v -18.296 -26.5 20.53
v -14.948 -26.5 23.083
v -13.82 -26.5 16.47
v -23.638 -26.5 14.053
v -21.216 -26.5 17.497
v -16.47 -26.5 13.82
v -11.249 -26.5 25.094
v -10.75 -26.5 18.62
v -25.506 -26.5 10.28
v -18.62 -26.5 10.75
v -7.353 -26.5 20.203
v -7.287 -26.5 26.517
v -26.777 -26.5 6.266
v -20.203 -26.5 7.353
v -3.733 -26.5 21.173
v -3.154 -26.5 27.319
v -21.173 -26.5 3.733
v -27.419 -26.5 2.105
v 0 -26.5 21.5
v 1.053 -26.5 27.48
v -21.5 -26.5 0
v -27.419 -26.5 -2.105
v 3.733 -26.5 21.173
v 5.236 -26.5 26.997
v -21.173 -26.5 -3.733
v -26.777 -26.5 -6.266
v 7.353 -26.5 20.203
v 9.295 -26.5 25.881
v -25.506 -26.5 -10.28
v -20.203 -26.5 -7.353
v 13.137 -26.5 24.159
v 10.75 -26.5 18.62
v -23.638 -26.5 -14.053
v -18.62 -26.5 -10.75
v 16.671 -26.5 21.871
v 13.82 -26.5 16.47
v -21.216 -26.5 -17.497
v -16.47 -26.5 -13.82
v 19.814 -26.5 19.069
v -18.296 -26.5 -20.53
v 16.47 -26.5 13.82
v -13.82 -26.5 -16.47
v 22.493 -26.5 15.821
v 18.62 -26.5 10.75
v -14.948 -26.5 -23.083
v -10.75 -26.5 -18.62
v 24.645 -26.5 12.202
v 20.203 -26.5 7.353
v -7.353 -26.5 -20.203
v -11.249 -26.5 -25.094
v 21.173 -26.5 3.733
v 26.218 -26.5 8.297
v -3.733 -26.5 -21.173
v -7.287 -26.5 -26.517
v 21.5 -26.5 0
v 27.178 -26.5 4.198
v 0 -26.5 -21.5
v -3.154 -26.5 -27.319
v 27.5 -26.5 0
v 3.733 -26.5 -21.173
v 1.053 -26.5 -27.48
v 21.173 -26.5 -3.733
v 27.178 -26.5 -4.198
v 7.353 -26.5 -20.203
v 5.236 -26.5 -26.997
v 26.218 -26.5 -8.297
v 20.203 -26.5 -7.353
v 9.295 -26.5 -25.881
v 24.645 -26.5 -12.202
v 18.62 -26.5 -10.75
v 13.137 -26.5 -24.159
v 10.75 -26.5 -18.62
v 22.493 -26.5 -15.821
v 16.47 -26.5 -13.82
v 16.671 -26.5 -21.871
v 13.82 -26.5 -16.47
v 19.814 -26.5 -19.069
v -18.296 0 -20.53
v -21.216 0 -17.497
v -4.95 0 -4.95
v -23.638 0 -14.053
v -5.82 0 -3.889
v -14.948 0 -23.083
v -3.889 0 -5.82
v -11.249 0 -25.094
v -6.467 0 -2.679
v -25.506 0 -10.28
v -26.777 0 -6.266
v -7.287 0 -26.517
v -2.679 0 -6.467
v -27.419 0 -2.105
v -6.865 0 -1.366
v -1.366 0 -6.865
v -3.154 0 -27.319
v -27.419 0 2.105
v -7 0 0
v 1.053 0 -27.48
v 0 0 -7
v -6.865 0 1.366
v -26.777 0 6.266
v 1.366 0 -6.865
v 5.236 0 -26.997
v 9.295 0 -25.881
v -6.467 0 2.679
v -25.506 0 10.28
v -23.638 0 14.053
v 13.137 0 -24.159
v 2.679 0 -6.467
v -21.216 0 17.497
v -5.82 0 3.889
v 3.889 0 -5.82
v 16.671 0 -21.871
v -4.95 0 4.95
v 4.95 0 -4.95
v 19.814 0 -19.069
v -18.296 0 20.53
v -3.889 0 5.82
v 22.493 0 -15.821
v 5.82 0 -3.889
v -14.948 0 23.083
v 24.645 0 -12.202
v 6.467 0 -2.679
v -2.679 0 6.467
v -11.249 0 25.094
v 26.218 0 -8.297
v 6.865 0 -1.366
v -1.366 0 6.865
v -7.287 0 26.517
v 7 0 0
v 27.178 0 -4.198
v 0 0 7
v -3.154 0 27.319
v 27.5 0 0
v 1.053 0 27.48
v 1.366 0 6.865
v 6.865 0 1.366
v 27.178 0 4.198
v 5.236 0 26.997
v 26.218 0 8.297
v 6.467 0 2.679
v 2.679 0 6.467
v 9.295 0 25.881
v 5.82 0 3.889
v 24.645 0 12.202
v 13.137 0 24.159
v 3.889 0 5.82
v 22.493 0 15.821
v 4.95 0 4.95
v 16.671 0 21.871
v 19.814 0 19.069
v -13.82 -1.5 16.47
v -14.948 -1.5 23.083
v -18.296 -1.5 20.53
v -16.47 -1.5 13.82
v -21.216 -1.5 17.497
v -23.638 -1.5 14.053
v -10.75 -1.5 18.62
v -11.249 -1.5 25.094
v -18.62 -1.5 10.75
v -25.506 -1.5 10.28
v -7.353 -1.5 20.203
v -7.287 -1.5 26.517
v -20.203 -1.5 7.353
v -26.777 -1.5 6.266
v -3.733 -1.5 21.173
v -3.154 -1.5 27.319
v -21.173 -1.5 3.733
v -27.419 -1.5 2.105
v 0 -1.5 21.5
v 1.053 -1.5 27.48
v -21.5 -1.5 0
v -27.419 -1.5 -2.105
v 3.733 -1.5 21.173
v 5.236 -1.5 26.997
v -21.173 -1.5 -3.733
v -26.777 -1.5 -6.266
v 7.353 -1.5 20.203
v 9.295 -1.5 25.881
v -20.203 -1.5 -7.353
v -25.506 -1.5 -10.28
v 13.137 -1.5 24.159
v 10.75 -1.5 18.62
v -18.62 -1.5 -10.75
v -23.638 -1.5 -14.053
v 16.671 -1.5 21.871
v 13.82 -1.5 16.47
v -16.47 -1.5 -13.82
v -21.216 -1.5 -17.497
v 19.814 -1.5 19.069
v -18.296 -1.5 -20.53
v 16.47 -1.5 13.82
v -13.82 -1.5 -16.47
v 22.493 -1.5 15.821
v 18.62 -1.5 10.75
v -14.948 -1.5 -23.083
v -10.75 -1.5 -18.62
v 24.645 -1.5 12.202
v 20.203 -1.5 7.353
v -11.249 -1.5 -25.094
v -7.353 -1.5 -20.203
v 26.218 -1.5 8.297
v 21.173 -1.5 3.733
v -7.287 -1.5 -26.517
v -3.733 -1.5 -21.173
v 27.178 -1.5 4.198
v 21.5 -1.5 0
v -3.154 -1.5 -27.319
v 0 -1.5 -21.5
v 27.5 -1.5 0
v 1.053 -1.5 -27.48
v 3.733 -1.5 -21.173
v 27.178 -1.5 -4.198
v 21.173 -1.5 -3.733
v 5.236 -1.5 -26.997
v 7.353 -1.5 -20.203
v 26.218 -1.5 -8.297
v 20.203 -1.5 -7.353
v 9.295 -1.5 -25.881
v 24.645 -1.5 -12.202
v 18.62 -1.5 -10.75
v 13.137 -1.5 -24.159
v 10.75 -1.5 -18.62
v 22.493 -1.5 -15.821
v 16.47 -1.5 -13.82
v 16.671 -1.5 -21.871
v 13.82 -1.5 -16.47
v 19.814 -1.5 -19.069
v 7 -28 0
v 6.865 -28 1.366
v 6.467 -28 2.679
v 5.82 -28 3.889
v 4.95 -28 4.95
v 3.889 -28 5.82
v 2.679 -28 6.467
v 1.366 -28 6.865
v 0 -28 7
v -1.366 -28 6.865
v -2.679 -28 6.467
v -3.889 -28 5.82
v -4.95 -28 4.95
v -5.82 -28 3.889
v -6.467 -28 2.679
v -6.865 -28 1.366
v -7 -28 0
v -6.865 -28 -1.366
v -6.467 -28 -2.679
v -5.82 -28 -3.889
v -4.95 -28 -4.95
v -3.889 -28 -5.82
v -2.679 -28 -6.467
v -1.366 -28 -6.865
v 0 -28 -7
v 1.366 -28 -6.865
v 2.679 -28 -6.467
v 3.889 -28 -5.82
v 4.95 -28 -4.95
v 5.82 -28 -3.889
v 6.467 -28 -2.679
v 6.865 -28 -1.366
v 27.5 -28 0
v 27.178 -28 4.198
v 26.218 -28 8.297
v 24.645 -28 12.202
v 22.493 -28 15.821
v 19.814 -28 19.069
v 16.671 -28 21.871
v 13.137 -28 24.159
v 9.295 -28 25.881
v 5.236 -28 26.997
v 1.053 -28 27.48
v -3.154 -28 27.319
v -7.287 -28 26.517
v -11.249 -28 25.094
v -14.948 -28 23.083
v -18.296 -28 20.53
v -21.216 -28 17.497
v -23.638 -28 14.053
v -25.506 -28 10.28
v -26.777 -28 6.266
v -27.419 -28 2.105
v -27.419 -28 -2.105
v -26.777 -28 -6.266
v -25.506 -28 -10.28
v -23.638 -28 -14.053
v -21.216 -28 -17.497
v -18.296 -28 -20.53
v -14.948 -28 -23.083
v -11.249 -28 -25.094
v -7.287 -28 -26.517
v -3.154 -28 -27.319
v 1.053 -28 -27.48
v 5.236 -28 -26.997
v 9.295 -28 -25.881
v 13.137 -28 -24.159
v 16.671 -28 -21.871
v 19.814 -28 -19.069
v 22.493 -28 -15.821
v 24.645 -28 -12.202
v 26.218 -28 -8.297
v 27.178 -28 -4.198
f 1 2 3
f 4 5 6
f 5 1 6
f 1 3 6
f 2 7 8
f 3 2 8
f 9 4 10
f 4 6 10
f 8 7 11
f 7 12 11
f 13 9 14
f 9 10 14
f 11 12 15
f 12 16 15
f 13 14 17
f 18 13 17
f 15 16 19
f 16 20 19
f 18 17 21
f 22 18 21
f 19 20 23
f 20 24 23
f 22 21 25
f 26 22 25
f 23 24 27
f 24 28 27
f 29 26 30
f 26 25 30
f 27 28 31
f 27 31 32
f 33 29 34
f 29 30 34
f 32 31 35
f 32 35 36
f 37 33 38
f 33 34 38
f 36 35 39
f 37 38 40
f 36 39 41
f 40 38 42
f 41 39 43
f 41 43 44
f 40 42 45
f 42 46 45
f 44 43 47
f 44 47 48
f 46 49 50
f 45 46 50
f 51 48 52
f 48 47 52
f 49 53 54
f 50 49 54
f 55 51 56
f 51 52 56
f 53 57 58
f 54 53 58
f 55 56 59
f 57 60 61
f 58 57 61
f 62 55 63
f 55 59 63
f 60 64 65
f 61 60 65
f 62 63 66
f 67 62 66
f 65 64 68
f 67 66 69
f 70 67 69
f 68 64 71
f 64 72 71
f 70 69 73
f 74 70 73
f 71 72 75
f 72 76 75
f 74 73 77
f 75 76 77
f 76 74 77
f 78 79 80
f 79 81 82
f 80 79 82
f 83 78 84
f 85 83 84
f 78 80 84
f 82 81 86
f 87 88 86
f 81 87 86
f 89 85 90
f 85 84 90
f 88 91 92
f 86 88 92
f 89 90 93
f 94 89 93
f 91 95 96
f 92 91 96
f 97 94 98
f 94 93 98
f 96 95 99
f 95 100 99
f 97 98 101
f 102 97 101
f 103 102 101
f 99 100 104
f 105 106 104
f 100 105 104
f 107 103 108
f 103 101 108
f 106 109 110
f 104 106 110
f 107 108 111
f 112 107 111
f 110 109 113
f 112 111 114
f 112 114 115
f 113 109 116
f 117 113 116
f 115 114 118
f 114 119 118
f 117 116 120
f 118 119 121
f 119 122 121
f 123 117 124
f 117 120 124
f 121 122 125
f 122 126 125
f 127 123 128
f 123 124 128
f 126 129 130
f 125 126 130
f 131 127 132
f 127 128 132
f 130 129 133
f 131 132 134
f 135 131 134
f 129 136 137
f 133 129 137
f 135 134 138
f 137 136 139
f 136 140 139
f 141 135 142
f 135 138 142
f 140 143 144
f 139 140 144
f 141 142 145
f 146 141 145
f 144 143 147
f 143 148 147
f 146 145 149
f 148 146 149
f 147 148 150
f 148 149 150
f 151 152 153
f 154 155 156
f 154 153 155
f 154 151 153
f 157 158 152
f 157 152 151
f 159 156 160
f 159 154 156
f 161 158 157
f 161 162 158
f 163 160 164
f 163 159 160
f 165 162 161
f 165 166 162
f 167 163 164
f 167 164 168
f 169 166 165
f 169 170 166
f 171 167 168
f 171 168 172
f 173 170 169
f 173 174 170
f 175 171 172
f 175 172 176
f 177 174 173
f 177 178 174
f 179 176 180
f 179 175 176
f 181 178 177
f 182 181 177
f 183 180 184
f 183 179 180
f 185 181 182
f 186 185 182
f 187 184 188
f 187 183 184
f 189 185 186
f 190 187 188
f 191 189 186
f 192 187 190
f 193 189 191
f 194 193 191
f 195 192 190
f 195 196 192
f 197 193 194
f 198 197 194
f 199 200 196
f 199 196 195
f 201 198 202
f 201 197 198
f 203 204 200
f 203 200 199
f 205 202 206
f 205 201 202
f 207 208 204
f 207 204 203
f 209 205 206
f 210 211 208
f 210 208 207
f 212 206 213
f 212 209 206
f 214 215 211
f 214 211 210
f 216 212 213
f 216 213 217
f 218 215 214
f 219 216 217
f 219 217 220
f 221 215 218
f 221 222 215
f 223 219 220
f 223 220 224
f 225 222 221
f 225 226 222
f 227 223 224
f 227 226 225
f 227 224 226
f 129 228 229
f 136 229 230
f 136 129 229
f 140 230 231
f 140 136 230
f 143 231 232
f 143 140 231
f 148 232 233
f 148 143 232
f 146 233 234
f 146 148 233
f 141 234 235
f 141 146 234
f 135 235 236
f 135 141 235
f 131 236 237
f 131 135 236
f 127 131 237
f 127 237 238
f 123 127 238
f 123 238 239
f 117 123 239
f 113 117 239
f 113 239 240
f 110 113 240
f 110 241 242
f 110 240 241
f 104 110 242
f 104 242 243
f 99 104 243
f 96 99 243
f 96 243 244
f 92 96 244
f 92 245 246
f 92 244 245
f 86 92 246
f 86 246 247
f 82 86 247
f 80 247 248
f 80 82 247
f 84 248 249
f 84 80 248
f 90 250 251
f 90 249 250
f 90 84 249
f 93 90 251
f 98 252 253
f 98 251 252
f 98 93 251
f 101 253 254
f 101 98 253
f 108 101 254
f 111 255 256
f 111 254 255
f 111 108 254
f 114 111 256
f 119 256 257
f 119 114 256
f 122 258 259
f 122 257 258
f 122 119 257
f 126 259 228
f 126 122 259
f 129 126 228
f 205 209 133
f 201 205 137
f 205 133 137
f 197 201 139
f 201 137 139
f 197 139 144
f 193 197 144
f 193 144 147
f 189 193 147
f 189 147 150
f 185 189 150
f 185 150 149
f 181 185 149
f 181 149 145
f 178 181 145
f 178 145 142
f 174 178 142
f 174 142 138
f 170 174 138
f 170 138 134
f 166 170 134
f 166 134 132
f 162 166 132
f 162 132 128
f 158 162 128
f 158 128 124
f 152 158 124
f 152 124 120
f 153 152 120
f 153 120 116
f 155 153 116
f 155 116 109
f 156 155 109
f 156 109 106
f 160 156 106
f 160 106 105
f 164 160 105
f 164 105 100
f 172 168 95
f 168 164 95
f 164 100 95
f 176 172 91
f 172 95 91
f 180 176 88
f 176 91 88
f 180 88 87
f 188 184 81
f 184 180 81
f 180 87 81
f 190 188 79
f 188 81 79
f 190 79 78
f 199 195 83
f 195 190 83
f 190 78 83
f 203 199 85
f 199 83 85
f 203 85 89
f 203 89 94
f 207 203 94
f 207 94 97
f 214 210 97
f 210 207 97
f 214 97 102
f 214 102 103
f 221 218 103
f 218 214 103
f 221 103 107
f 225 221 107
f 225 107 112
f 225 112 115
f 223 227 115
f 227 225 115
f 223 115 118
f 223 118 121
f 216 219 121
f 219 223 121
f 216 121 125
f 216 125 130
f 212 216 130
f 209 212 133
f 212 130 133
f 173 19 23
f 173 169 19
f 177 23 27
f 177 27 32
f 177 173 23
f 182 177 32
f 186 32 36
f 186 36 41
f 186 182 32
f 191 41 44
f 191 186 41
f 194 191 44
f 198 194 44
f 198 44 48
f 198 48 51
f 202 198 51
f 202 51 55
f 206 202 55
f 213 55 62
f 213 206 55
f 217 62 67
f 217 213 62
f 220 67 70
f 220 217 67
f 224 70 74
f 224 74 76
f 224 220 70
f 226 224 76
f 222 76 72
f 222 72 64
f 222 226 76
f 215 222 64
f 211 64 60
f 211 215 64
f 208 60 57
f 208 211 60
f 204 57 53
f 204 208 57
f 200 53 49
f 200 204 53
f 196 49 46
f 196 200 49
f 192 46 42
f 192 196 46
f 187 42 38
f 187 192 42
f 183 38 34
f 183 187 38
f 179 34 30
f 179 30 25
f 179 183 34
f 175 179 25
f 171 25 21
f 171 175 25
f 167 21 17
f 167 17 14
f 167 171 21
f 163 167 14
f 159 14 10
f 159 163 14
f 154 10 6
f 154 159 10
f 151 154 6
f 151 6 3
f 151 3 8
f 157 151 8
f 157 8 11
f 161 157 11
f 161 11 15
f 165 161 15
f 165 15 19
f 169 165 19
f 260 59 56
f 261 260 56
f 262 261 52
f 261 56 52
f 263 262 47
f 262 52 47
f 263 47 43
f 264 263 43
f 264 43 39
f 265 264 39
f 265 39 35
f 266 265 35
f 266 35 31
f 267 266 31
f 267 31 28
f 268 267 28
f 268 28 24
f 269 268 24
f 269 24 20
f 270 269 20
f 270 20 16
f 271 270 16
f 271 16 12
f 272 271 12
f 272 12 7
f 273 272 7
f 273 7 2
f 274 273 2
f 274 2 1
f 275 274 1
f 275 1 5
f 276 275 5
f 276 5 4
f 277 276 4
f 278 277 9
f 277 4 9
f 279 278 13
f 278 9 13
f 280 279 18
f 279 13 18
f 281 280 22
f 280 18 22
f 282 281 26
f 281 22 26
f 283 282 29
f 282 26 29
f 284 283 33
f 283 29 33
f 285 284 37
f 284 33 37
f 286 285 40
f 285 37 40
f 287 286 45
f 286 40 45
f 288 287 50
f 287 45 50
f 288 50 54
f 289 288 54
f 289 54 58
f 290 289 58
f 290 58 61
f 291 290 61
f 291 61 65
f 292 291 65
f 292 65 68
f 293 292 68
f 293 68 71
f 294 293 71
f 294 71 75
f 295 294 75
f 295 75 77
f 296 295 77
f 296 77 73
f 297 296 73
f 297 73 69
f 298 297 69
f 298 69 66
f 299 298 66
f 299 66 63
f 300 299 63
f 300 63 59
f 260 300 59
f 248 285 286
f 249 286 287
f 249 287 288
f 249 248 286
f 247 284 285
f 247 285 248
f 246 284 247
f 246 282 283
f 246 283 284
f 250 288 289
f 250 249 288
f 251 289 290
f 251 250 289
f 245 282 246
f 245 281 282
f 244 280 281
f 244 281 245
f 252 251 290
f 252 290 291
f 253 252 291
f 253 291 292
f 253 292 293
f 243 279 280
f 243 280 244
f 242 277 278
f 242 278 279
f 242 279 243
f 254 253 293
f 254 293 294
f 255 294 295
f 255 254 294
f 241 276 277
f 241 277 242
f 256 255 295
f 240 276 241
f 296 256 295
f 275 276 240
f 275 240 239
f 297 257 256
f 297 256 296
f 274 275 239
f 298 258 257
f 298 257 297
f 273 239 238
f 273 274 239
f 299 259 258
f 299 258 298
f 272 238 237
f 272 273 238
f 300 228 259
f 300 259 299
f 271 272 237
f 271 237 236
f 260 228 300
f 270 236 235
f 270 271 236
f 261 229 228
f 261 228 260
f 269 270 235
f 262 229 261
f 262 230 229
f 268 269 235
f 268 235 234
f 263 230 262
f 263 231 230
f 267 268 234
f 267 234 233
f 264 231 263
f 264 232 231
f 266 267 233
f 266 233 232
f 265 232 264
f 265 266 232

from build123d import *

# Parameters (mm, degrees)
F0_R     = 27.5
F1_DEPTH = 28
F2_W     = 25
F2_H     = 6
F4_R     = 7
F5_DEPTH = 28.001


with BuildPart() as f1:
    # F0 (on Front) → F1 (new body)
    with BuildSketch(Plane.XZ):
        Circle(F0_R)
    extrude(amount=F1_DEPTH)

    # F2 (on Right) → F3 (revolve, cut)
    with BuildSketch(Plane.YZ):
        with Locations((-14, 24.5)):
            Rectangle(F2_W, F2_H)
    revolve(axis=Axis((0, 0, 0), (0, 1, 0)), mode=Mode.SUBTRACT)

    # F4 (on Front) → F5 (cut, through all)
    with BuildSketch(Plane.XZ):
        Circle(F4_R)
    extrude(amount=F5_DEPTH, mode=Mode.SUBTRACT)


solid = f1.part
